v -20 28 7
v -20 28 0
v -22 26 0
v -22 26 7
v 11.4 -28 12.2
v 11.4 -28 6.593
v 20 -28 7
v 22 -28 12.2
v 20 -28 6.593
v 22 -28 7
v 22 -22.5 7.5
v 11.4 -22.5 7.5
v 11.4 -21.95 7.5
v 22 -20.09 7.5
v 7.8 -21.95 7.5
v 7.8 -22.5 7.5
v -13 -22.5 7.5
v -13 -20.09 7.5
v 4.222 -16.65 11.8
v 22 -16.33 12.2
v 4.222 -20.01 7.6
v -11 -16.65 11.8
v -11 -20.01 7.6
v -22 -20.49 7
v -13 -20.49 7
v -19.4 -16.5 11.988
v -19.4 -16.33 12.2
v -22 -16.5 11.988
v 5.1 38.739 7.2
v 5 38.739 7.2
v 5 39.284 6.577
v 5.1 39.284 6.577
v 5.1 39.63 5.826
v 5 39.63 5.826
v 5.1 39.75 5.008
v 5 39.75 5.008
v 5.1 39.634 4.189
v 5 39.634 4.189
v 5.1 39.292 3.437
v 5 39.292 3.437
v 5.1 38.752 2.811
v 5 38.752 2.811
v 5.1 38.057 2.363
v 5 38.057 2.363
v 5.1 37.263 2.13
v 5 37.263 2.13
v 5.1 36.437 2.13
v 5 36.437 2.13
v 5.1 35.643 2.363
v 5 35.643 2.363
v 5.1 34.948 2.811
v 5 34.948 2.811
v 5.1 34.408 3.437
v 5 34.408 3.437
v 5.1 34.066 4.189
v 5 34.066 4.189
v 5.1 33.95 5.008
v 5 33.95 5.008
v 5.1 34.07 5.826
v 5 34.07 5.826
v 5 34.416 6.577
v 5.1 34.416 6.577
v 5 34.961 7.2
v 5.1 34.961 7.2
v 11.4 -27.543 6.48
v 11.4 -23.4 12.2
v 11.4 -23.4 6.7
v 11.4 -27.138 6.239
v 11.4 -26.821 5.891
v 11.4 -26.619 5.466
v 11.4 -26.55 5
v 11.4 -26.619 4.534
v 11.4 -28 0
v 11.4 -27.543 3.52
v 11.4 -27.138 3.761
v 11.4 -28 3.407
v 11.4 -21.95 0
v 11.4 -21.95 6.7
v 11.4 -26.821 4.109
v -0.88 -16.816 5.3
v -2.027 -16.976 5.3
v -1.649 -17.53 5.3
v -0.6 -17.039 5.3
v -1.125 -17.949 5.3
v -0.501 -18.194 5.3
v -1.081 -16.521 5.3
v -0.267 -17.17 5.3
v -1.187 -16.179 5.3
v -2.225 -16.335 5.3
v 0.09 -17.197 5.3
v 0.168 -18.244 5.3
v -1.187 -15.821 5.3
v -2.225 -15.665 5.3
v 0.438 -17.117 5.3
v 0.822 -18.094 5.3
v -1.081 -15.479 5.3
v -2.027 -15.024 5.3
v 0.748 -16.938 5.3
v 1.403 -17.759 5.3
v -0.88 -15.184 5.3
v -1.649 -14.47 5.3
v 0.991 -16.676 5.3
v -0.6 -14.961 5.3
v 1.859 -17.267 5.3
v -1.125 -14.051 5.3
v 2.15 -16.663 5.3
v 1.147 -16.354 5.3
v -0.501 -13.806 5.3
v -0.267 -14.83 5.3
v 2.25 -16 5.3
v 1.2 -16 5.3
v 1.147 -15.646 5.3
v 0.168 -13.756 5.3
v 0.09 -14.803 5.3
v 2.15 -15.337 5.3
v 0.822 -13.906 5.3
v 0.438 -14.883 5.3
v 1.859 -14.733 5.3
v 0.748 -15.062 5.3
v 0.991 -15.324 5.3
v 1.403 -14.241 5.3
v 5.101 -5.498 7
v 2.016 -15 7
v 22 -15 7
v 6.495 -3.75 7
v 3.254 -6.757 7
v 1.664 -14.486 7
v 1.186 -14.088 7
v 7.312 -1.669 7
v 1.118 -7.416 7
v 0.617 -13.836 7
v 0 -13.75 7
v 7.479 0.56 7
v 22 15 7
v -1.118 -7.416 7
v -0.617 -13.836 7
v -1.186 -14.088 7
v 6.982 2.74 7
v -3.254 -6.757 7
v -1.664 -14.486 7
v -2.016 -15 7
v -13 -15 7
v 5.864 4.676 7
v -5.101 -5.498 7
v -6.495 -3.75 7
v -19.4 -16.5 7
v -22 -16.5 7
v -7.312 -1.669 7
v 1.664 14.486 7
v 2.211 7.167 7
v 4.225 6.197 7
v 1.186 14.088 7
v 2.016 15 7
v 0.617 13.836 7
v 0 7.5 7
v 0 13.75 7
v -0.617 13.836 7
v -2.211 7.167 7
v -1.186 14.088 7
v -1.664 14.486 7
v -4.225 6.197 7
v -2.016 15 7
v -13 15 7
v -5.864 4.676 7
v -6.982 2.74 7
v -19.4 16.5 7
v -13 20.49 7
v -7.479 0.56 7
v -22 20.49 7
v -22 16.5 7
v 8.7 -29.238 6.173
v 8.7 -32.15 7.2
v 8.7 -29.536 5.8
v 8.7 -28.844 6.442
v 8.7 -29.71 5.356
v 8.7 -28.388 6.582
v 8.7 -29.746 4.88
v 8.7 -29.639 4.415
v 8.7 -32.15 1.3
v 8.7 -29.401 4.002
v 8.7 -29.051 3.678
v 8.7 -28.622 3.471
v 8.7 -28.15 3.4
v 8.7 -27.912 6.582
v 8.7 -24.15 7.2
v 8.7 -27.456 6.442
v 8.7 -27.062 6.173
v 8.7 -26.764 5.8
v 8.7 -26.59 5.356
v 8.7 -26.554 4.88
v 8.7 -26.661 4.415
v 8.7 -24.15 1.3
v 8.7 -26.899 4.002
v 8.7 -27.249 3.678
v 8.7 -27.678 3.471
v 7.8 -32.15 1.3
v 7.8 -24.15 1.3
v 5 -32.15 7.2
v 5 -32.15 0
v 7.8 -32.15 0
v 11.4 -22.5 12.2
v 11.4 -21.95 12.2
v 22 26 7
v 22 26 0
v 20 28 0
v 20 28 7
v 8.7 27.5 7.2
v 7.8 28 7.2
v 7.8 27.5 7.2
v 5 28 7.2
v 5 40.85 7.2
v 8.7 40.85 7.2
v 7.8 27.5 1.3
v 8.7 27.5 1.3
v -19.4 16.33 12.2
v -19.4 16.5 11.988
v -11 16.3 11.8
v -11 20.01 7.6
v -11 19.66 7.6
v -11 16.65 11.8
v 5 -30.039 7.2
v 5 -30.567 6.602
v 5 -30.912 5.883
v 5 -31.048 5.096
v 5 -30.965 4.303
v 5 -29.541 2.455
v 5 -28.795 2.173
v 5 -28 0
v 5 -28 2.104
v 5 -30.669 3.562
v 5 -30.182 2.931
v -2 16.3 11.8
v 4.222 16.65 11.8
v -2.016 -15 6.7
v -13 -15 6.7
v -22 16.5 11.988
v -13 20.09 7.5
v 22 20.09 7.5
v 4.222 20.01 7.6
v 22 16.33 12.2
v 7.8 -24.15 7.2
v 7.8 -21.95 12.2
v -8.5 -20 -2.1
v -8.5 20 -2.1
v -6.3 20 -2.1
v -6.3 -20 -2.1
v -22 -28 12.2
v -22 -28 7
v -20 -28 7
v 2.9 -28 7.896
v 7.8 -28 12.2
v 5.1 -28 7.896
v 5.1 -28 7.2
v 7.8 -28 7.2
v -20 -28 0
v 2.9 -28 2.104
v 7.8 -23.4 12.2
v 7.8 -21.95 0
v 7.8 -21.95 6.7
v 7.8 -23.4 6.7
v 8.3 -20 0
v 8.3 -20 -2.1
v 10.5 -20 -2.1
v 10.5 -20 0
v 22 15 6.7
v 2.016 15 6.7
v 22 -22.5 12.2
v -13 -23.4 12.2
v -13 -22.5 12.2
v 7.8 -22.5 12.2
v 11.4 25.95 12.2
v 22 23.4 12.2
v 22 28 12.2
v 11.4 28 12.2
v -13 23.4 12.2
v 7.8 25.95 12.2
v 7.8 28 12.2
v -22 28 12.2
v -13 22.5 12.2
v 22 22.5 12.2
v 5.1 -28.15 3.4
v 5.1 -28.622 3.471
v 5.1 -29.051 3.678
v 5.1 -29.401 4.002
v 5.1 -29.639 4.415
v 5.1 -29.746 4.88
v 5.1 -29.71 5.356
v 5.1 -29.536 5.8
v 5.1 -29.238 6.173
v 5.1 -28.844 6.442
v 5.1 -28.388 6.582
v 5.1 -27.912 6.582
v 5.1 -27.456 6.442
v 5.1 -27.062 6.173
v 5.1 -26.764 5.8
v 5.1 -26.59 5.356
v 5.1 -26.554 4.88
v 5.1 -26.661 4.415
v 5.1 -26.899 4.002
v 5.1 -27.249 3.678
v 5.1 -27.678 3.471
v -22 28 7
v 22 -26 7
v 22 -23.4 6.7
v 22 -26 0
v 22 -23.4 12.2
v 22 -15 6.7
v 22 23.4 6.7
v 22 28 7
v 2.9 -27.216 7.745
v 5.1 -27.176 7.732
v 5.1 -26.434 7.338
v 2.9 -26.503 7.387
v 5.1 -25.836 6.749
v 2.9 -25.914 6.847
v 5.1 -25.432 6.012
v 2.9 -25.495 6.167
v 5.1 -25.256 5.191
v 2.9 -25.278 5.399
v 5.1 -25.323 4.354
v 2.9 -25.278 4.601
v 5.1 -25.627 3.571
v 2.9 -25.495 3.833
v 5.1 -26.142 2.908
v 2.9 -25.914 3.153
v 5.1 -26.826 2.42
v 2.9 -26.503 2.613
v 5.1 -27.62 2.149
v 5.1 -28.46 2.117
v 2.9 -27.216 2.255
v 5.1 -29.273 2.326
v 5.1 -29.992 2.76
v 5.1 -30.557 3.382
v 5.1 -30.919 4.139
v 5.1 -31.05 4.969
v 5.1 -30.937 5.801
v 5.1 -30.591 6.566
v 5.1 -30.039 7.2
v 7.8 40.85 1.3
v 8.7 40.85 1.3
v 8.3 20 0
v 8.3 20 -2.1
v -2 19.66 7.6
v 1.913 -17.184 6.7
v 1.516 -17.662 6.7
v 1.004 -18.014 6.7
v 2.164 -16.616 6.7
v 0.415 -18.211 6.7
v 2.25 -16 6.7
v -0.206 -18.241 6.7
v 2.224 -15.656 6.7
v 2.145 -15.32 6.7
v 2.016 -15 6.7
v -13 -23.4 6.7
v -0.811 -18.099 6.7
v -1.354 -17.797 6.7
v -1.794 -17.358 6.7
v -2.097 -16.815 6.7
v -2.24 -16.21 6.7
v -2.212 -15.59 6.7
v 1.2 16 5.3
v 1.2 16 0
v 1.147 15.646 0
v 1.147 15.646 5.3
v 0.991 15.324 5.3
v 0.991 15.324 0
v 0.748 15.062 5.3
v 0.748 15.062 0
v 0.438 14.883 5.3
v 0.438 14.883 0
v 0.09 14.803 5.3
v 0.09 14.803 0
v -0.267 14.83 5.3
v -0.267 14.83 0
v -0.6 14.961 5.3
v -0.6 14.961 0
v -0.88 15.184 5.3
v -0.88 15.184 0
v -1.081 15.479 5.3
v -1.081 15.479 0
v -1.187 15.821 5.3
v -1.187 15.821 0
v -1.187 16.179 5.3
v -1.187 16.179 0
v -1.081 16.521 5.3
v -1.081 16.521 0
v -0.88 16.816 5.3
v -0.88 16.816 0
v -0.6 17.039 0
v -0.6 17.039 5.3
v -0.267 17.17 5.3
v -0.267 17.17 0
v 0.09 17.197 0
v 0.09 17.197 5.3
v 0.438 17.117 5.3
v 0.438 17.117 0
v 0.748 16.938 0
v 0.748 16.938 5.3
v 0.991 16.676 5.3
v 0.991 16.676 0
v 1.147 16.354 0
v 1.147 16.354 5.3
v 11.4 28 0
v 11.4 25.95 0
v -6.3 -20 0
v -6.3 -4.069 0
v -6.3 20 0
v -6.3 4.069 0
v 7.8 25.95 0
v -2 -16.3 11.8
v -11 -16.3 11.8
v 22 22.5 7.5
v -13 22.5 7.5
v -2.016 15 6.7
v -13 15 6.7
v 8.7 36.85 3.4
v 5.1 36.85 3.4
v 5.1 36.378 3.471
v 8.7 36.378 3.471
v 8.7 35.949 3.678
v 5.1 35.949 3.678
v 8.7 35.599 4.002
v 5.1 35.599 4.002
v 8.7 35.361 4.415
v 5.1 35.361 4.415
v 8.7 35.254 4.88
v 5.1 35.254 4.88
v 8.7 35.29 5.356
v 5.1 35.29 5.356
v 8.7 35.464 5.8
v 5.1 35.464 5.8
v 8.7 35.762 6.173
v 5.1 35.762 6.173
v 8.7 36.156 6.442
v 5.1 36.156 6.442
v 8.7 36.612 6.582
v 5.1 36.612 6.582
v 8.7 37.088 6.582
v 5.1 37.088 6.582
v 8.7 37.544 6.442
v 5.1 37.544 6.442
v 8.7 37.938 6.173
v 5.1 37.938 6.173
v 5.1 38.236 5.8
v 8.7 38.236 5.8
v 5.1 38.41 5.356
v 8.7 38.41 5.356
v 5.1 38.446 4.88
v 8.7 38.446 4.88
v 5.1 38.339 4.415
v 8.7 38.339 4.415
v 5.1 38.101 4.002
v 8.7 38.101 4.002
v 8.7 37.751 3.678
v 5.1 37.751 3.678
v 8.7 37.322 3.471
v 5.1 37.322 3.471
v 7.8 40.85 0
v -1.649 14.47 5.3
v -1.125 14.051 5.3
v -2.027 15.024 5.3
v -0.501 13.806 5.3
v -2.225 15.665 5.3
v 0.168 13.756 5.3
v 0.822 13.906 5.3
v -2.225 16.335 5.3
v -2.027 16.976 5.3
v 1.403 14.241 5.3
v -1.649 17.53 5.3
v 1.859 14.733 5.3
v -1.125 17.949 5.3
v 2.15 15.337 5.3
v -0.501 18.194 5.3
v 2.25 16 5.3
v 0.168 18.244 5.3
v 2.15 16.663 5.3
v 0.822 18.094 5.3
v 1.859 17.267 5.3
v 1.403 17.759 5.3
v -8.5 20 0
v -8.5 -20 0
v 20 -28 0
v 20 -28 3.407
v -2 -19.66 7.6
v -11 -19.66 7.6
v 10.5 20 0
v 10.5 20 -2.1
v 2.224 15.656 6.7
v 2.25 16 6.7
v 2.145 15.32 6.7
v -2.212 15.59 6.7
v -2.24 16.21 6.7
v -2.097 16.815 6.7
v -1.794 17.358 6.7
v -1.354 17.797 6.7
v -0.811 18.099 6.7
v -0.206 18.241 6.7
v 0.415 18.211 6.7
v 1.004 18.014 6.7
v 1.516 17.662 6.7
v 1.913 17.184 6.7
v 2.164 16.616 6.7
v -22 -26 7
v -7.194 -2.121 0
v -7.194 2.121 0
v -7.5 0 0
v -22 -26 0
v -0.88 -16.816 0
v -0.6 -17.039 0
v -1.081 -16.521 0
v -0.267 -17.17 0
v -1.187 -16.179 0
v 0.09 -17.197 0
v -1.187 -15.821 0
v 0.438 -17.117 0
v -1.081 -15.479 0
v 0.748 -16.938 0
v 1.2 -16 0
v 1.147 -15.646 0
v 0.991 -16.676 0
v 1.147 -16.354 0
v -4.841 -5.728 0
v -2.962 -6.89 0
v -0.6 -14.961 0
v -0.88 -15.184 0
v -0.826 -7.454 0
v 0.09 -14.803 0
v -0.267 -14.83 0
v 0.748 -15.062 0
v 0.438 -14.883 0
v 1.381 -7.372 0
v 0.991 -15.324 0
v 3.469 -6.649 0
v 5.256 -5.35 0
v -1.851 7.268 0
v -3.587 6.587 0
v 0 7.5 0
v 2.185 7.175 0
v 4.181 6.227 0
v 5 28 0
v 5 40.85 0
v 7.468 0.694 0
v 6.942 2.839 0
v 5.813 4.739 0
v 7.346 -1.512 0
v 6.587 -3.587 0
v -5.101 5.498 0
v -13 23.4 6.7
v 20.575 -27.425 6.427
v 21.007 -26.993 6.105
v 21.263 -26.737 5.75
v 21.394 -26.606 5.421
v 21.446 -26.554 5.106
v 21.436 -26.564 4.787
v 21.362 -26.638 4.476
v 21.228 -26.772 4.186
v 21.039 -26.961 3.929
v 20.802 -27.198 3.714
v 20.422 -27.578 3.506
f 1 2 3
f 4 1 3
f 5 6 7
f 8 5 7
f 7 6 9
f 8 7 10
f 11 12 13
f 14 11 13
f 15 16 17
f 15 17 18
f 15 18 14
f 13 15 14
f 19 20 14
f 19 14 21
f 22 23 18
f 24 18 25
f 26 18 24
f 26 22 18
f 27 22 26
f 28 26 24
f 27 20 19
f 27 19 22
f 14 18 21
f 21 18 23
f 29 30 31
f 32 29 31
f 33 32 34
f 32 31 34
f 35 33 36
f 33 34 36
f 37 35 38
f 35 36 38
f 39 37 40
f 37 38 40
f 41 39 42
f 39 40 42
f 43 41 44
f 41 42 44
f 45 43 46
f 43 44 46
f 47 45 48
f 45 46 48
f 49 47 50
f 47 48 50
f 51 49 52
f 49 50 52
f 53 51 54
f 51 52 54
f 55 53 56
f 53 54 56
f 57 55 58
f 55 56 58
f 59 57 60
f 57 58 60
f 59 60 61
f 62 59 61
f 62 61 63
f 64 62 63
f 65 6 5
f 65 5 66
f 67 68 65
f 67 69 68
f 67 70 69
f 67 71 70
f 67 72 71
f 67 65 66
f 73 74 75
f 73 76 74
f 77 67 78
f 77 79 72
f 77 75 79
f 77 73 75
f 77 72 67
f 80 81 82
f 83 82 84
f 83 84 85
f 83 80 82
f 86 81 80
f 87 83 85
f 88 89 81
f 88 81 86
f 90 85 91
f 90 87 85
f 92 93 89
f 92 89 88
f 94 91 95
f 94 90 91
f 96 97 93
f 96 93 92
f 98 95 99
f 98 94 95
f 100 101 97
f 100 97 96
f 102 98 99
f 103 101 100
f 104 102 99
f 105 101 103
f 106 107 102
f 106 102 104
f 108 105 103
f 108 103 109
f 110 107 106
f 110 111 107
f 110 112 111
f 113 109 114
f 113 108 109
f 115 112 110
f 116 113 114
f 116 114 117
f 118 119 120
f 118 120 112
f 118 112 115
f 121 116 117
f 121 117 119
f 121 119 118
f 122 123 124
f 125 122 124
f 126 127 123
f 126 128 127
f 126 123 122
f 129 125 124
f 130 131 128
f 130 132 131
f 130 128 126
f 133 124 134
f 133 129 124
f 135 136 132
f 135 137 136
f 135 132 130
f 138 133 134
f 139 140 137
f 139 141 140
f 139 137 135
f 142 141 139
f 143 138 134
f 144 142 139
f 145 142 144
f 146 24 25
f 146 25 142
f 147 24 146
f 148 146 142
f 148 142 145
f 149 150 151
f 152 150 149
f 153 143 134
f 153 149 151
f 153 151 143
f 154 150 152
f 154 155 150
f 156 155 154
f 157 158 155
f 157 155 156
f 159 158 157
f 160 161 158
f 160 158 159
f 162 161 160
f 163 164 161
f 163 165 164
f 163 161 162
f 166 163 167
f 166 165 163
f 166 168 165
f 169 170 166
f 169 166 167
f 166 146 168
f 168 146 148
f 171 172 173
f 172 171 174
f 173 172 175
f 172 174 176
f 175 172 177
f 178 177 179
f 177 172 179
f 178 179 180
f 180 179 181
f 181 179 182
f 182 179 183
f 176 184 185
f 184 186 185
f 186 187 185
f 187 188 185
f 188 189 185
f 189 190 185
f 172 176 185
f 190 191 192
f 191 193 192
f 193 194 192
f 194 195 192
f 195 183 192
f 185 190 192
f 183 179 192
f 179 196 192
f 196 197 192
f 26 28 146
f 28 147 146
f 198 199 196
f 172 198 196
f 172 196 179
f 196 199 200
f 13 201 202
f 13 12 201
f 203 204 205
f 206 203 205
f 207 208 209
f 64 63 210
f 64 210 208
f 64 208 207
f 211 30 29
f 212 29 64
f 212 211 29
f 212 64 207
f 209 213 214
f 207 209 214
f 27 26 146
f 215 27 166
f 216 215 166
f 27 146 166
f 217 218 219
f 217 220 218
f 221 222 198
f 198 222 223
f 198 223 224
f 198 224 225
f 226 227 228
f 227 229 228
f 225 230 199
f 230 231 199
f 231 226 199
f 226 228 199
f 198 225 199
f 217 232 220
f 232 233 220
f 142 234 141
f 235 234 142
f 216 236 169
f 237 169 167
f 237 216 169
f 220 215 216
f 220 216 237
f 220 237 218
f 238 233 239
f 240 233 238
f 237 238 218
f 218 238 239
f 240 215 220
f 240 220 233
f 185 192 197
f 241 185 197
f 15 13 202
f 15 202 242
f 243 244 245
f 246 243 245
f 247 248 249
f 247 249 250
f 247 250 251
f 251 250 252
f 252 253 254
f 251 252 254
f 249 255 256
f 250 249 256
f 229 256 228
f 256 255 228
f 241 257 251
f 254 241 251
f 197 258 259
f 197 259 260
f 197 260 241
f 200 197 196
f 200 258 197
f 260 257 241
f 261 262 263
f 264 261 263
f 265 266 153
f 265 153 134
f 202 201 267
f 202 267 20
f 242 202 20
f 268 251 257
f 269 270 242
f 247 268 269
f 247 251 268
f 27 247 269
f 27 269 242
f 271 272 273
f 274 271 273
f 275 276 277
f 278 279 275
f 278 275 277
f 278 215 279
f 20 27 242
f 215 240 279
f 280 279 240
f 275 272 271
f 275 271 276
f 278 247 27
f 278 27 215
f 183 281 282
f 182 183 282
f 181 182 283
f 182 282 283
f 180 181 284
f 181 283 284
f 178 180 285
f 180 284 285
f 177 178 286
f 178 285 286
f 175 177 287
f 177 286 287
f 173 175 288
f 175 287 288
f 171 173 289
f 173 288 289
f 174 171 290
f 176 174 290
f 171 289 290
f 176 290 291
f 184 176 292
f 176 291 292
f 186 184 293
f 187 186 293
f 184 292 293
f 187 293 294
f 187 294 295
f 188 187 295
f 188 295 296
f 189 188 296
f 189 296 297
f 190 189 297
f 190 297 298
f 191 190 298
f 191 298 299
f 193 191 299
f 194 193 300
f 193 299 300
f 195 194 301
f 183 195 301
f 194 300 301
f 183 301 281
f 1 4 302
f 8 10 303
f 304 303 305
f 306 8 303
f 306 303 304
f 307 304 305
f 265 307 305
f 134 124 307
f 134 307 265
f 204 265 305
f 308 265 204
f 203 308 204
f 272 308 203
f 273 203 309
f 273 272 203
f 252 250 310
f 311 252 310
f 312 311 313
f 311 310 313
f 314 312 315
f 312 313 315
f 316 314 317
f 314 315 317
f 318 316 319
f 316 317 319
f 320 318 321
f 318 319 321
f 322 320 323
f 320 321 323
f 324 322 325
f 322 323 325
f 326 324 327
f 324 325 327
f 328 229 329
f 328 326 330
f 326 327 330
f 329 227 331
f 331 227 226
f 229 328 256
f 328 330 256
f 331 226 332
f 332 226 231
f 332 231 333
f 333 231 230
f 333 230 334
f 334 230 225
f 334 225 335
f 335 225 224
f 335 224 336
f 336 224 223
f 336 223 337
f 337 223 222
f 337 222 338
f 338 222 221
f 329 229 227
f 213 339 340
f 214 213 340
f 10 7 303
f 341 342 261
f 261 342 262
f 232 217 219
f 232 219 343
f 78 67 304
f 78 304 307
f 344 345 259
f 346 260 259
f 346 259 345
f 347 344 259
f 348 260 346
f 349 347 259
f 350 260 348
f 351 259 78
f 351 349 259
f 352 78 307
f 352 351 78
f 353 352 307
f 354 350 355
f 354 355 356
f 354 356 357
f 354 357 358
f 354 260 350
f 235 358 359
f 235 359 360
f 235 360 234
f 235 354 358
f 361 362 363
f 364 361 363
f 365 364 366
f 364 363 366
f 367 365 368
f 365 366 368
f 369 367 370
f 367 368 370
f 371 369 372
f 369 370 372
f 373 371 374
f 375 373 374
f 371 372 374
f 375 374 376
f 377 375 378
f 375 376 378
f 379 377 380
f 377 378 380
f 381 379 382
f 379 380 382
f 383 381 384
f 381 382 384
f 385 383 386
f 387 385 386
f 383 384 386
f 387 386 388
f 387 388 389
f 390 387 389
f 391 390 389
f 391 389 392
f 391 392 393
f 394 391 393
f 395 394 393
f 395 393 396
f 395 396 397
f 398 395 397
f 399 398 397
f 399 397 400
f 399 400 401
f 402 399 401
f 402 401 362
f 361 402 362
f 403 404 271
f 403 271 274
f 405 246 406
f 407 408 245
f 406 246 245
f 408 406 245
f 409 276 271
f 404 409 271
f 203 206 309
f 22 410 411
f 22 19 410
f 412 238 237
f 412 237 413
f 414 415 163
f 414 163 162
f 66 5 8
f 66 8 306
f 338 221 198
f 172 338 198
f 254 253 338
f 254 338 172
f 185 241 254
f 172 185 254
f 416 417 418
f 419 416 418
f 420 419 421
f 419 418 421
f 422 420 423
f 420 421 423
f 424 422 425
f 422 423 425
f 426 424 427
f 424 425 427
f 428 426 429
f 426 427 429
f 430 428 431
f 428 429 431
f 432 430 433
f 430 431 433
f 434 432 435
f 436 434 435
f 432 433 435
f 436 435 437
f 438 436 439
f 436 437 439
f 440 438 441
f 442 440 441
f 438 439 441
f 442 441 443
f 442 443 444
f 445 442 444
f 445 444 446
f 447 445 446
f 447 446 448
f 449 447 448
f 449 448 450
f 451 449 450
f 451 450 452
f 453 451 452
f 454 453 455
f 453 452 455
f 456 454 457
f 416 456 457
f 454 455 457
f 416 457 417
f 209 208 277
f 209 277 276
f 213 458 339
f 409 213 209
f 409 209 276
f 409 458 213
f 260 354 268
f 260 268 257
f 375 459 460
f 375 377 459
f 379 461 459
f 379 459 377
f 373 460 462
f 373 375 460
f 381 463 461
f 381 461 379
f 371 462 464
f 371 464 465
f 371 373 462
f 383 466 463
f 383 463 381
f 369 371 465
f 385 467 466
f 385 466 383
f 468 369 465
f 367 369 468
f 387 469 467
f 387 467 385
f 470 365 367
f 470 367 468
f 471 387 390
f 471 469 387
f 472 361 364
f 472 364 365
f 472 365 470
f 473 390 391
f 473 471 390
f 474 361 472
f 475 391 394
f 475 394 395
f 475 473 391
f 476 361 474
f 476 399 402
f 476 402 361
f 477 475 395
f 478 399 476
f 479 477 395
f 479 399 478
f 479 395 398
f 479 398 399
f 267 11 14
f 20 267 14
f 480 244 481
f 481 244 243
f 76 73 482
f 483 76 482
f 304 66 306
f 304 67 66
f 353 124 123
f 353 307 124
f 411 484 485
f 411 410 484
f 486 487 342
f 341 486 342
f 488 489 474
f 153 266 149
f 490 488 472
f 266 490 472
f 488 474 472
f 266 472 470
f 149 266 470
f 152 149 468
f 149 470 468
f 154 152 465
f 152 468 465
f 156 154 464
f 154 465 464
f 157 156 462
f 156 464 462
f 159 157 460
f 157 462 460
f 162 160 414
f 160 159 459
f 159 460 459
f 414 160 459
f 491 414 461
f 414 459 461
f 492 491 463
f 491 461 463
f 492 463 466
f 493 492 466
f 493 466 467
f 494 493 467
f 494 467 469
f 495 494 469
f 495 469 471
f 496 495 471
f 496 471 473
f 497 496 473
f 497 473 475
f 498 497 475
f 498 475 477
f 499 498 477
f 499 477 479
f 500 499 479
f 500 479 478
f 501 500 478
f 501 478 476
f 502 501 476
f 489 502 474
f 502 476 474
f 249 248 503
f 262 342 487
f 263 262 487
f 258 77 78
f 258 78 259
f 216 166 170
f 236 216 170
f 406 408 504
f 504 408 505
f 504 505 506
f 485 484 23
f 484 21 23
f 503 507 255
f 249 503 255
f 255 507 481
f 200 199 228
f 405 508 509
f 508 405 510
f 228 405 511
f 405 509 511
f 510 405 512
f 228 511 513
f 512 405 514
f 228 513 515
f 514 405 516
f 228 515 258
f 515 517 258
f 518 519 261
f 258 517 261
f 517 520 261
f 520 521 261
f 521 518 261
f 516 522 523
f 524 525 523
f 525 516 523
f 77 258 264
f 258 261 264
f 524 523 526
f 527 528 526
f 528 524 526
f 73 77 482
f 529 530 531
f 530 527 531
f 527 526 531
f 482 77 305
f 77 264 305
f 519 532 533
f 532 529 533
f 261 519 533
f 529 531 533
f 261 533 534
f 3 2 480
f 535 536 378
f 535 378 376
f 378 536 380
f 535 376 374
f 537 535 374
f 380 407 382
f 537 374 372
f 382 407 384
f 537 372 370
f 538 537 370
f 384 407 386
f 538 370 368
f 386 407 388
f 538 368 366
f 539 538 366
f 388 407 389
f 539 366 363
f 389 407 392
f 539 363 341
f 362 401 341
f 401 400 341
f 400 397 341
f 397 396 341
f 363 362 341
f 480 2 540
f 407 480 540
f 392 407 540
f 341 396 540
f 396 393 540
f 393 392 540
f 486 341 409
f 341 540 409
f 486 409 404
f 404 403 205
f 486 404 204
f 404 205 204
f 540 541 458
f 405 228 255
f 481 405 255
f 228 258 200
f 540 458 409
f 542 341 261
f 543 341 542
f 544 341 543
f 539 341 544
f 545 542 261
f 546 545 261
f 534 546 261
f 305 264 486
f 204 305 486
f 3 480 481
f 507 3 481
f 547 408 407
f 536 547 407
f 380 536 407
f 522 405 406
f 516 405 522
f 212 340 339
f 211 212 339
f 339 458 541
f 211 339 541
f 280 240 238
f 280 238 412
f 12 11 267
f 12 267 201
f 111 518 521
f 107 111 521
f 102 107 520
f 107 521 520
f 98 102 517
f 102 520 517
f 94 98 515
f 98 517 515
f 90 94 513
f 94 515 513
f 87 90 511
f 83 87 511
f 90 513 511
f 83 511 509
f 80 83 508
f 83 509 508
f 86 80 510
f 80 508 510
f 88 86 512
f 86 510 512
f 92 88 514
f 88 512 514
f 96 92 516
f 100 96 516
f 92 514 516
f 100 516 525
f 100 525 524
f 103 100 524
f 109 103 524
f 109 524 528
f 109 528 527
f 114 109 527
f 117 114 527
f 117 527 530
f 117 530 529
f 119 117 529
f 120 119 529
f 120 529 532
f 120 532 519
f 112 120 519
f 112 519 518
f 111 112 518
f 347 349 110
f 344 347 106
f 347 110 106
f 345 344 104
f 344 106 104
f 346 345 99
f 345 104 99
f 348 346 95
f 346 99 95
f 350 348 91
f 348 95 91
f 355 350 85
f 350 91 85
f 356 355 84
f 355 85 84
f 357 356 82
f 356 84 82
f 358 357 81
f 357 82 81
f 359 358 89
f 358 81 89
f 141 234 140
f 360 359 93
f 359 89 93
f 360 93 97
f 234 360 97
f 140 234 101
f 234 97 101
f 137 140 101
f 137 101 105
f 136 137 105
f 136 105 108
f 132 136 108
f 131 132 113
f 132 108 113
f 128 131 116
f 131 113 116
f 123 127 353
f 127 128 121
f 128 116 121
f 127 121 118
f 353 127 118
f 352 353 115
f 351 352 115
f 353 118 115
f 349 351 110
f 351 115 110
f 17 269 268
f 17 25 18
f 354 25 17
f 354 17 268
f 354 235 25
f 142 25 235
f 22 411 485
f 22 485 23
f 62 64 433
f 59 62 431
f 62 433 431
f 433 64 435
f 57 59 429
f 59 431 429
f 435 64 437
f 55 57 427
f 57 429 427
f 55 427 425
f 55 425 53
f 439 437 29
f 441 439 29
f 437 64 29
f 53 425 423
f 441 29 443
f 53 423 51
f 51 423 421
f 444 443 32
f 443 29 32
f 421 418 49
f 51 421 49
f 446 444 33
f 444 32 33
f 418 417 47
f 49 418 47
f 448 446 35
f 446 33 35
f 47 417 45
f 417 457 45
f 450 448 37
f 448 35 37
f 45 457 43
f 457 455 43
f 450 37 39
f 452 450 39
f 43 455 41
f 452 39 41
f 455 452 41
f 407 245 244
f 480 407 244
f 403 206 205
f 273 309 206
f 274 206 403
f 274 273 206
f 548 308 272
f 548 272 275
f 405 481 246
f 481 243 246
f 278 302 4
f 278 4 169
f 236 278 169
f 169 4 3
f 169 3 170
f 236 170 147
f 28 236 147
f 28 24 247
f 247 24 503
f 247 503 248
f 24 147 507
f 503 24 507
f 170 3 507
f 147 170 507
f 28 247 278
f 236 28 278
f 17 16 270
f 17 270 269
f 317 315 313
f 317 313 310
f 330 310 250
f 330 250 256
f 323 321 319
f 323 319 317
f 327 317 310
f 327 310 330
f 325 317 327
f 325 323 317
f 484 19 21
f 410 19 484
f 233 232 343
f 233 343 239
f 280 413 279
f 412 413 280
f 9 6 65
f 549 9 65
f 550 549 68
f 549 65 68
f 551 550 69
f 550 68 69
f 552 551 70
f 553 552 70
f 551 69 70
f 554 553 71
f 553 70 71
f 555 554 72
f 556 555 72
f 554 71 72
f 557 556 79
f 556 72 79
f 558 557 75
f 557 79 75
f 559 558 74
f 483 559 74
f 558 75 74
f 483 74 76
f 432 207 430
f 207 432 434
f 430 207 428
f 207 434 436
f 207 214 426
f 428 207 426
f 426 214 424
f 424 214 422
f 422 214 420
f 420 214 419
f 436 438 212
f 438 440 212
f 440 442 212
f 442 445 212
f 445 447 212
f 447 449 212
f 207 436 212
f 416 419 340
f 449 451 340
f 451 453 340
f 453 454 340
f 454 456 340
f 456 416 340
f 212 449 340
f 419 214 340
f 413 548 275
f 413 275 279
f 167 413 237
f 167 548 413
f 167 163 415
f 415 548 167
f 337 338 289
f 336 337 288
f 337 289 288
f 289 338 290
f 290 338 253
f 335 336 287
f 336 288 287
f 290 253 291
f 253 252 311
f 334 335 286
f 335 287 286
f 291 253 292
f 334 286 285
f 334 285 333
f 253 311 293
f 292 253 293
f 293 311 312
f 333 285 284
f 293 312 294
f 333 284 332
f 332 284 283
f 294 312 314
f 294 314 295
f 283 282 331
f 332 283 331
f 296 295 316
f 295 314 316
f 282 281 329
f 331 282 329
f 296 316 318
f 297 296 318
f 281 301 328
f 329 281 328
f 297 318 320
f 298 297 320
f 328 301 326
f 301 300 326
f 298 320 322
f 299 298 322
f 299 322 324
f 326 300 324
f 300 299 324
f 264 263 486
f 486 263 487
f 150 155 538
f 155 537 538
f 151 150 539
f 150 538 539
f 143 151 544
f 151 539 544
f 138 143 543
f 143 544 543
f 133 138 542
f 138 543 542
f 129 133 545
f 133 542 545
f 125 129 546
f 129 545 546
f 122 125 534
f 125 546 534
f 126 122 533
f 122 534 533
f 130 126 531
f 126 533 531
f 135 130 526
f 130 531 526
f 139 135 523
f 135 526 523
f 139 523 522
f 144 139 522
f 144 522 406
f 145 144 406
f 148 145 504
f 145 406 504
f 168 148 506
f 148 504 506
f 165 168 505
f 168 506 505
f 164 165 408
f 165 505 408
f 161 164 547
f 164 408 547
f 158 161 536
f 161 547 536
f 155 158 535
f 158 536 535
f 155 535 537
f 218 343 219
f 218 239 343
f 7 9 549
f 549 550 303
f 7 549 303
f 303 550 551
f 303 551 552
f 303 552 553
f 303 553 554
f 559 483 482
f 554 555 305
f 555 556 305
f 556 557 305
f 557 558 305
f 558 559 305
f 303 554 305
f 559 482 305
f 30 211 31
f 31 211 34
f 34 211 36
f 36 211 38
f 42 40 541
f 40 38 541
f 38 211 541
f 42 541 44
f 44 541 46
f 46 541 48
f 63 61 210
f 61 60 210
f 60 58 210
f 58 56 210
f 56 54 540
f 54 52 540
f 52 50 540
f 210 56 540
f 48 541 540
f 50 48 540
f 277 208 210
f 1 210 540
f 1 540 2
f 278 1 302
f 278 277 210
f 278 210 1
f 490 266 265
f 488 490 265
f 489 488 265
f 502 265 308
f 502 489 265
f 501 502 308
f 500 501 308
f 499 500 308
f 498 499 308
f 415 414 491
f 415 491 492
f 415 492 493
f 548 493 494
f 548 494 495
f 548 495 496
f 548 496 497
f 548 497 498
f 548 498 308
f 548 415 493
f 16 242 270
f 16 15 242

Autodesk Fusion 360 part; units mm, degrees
ref_plane "工作平面1" through (0, 0, 0) normal (0, 0, 1) x (1, 0, 0)
sketch "草图1" plane through (0, 0, 0) normal (0, 0, 1) x (1, 0, 0)
  line L0 (-26, -22) -> (26, -22)
  line L1 (26, -22) -> (28, -20)
  line L2 (28, -20) -> (28, 20)
  line L3 (28, 20) -> (26, 22)
  line L4 (26, 22) -> (-26, 22)
  line L5 (-26, 22) -> (-28, 20)
  line L6 (-28, 20) -> (-28, -20)
  line L7 (-28, -20) -> (-26, -22)
extrude "56 x 44 x 7 platform" add sketch "草图1" along normal blind 7
ref_plane "工作平面2" through (0, 0, 7) normal (0, 0, 1) x (1, 0, 0)
sketch "草图2" plane through (0, 0, 7) normal (0, 0, 1) x (1, 0, 0)
  line L0 (-28, -22) -> (-20.49, -22)
  line L1 (-20.49, -22) -> (-20.49, 22)
  line L2 (-20.49, 22) -> (-28, 22)
  line L3 (-28, 22) -> (-28, -22)
ref_plane "工作平面3" through (0, 0, 12.2) normal (0, 0, 1) x (1, 0, 0)
sketch "草图3" plane through (0, 0, 12.2) normal (0, 0, 1) x (1, 0, 0)
  line L0 (-28, -22) -> (-16.33, -22)
  line L1 (-16.33, -22) -> (-16.33, 22)
  line L2 (-16.33, 22) -> (-28, 22)
  line L3 (-28, 22) -> (-28, -22)
loft "Dovetail retaining rail 0.8 to 1 -1" add profiles "草图2", "草图3" section 1 section 2
ref_plane "工作平面4" through (0, 0, 6.7) normal (0, 0, 1) x (1, 0, 0)
sketch "草图4" plane through (0, 0, 6.7) normal (0, 0, 1) x (1, 0, 0)
  line L0 (-23.4, -22) -> (-22.5, -22)
  line L1 (-22.5, -22) -> (-22.5, 13)
  line L2 (-22.5, 13) -> (-23.4, 13)
  line L3 (-23.4, 13) -> (-23.4, -22)
extrude "0.9 mm longitudinal flexure slot -1" cut sketch "草图4" along normal blind 5.8
ref_plane "工作平面5" through (0, 0, 6.7) normal (0, 0, 1) x (1, 0, 0)
sketch "草图5" plane through (0, 0, 6.7) normal (0, 0, 1) x (1, 0, 0)
  line L0 (-22.5, -22) -> (-15, -22)
  line L1 (-15, -22) -> (-15, 13)
  line L2 (-15, 13) -> (-22.5, 13)
  line L3 (-22.5, 13) -> (-22.5, -22)
extrude "0.8 mm flexure underside relief -1" cut sketch "草图5" along normal blind 0.8
ref_plane "工作平面6" through (0, 0, 7.6) normal (0, 0, 1) x (1, 0, 0)
sketch "草图6" plane through (0, 0, 7.6) normal (0, 0, 1) x (1, 0, 0)
  line L0 (-20.21, -6) -> (-20.21, 11)
  line L1 (-20.21, 11) -> (-19.66, 11)
  line L2 (-19.66, 11) -> (-19.66, 2)
  line L3 (-19.66, 2) -> (-20.11, -6)
  line L4 (-20.11, -6) -> (-20.21, -6)
ref_plane "工作平面7" through (0, 0, 11.8) normal (0, 0, 1) x (1, 0, 0)
sketch "草图7" plane through (0, 0, 11.8) normal (0, 0, 1) x (1, 0, 0)
  line L0 (-16.85, -6) -> (-16.85, 11)
  line L1 (-16.85, 11) -> (-16.3, 11)
  line L2 (-16.3, 11) -> (-16.3, 2)
  line L3 (-16.3, 2) -> (-16.75, -6)
  line L4 (-16.75, -6) -> (-16.85, -6)
loft "Tapered friction contact rib -1" add profiles "草图6", "草图7" section 1 section 2
ref_plane "工作平面8" through (0, 0, 7) normal (0, 0, 1) x (1, 0, 0)
sketch "草图8" plane through (0, 0, 7) normal (0, 0, 1) x (1, 0, 0)
  line L0 (20.49, -22) -> (28, -22)
  line L1 (28, -22) -> (28, 22)
  line L2 (28, 22) -> (20.49, 22)
  line L3 (20.49, 22) -> (20.49, -22)
ref_plane "工作平面9" through (0, 0, 12.2) normal (0, 0, 1) x (1, 0, 0)
sketch "草图9" plane through (0, 0, 12.2) normal (0, 0, 1) x (1, 0, 0)
  line L0 (16.33, -22) -> (28, -22)
  line L1 (28, -22) -> (28, 22)
  line L2 (28, 22) -> (16.33, 22)
  line L3 (16.33, 22) -> (16.33, -22)
loft "Dovetail retaining rail 0.8 to 1 1" add profiles "草图8", "草图9" section 1 section 2
ref_plane "工作平面10" through (0, 0, 6.7) normal (0, 0, 1) x (1, 0, 0)
sketch "草图10" plane through (0, 0, 6.7) normal (0, 0, 1) x (1, 0, 0)
  line L0 (22.5, -22) -> (23.4, -22)
  line L1 (23.4, -22) -> (23.4, 13)
  line L2 (23.4, 13) -> (22.5, 13)
  line L3 (22.5, 13) -> (22.5, -22)
extrude "0.9 mm longitudinal flexure slot 1" cut sketch "草图10" along normal blind 5.8
ref_plane "工作平面11" through (0, 0, 6.7) normal (0, 0, 1) x (1, 0, 0)
sketch "草图11" plane through (0, 0, 6.7) normal (0, 0, 1) x (1, 0, 0)
  line L0 (15, -22) -> (22.5, -22)
  line L1 (22.5, -22) -> (22.5, 13)
  line L2 (22.5, 13) -> (15, 13)
  line L3 (15, 13) -> (15, -22)
extrude "0.8 mm flexure underside relief 1" cut sketch "草图11" along normal blind 0.8
ref_plane "工作平面12" through (0, 0, 7.6) normal (0, 0, 1) x (1, 0, 0)
sketch "草图12" plane through (0, 0, 7.6) normal (0, 0, 1) x (1, 0, 0)
  line L0 (20.21, -6) -> (20.21, 11)
  line L1 (20.21, 11) -> (19.66, 11)
  line L2 (19.66, 11) -> (19.66, 2)
  line L3 (19.66, 2) -> (20.11, -6)
  line L4 (20.11, -6) -> (20.21, -6)
ref_plane "工作平面13" through (0, 0, 11.8) normal (0, 0, 1) x (1, 0, 0)
sketch "草图13" plane through (0, 0, 11.8) normal (0, 0, 1) x (1, 0, 0)
  line L0 (16.85, -6) -> (16.85, 11)
  line L1 (16.85, 11) -> (16.3, 11)
  line L2 (16.3, 11) -> (16.3, 2)
  line L3 (16.3, 2) -> (16.75, -6)
  line L4 (16.75, -6) -> (16.85, -6)
loft "Tapered friction contact rib 1" add profiles "草图12", "草图13" section 1 section 2
ref_plane "工作平面14" through (0, 0, 7) normal (0, 0, 1) x (1, 0, 0)
sketch "草图14" plane through (0, 0, 7) normal (0, 0, 1) x (1, 0, 0)
  line L0 (-16.5, 19.4) -> (16.5, 19.4)
  line L1 (16.5, 19.4) -> (16.5, 22)
  line L2 (16.5, 22) -> (-16.5, 22)
  line L3 (-16.5, 22) -> (-16.5, 19.4)
extrude "Closed insertion end stop" add sketch "草图14" along normal blind 5.2
ref_plane "工作平面15" through (0, 0, 0) normal (0, 0, 1) x (1, 0, 0)
sketch "草图15" plane through (0, 0, 0) normal (0, 0, 1) x (1, 0, 0)
  circle A0 centre (0, 0) radius 7.5
extrude "15 mm screw and driver access" cut sketch "草图15" along normal blind 7
move_body "Align camera long edge with gimbal arm - 90 degrees" bodies 1 to x (0, 1, 0) y (-1, 0, 0) z (0, 0, 1) at (0, 0, 0)
ref_plane "工作平面16" through (0, 0, 0) normal (0, 0, 1) x (1, 0, 0)
sketch "草图16" plane through (0, 0, 0) normal (0, 0, 1) x (1, 0, 0)
  line L0 (7.8, -28) -> (11.4, -28)
  line L1 (11.4, -28) -> (11.4, -21.95)
  line L2 (11.4, -21.95) -> (7.8, -21.95)
  line L3 (7.8, -21.95) -> (7.8, -28)
extrude "Clear original raised tab and root fillet" cut sketch "草图16" along normal blind 12.3
ref_plane "工作平面17" through (0, 0, 0) normal (0, 0, 1) x (1, 0, 0)
sketch "草图17" plane through (0, 0, 0) normal (0, 0, 1) x (1, 0, 0)
  line L0 (7.8, 25.95) -> (11.4, 25.95)
  line L1 (11.4, 25.95) -> (11.4, 28)
  line L2 (11.4, 28) -> (7.8, 28)
  line L3 (7.8, 28) -> (7.8, 25.95)
extrude "Clear original raised tab and root fillet (1)" cut sketch "草图17" along normal blind 12.3
ref_plane "工作平面18" through (0, 0, -2.1) normal (0, 0, 1) x (1, 0, 0)
sketch "草图18" plane through (0, 0, -2.1) normal (0, 0, 1) x (1, 0, 0)
  line L0 (-8.5, -20) -> (-6.3, -20)
  line L1 (-6.3, -20) -> (-6.3, 20)
  line L2 (-6.3, 20) -> (-8.5, 20)
  line L3 (-8.5, 20) -> (-8.5, -20)
extrude "Arm lateral locating shoulder" add sketch "草图18" along normal blind 2.1
ref_plane "工作平面19" through (0, 0, -2.1) normal (0, 0, 1) x (1, 0, 0)
sketch "草图19" plane through (0, 0, -2.1) normal (0, 0, 1) x (1, 0, 0)
  line L0 (8.3, -20) -> (10.5, -20)
  line L1 (10.5, -20) -> (10.5, 20)
  line L2 (10.5, 20) -> (8.3, 20)
  line L3 (8.3, 20) -> (8.3, -20)
extrude "Arm lateral locating shoulder (1)" add sketch "草图19" along normal blind 2.1
ref_plane "工作平面20" through (0, 0, 0) normal (0, 0, 1) x (1, 0, 0)
sketch "草图20" plane through (0, 0, 0) normal (0, 0, 1) x (1, 0, 0)
  circle A0 centre (0, -16) radius 1.2
extrude "M2 through clearance at y -16.0" cut sketch "草图20" along normal blind 7
ref_plane "工作平面21" through (0, 0, 5.3) normal (0, 0, 1) x (1, 0, 0)
sketch "草图21" plane through (0, 0, 5.3) normal (0, 0, 1) x (1, 0, 0)
  circle A0 centre (0, -16) radius 2.25
extrude "M2 head recess at y -16.0" cut sketch "草图21" along normal blind 1.7
ref_plane "工作平面22" through (0, 0, 0) normal (0, 0, 1) x (1, 0, 0)
sketch "草图22" plane through (0, 0, 0) normal (0, 0, 1) x (1, 0, 0)
  circle A0 centre (0, 16) radius 1.2
extrude "M2 through clearance at y 16.0" cut sketch "草图22" along normal blind 7
ref_plane "工作平面23" through (0, 0, 5.3) normal (0, 0, 1) x (1, 0, 0)
sketch "草图23" plane through (0, 0, 5.3) normal (0, 0, 1) x (1, 0, 0)
  circle A0 centre (0, 16) radius 2.25
extrude "M2 head recess at y 16.0" cut sketch "草图23" along normal blind 1.7
ref_plane "工作平面24" through (0, 0, 0) normal (0, 0, 1) x (1, 0, 0)
sketch "草图24" plane through (0, 0, 0) normal (0, 0, 1) x (1, 0, 0)
  line L0 (5, -32.15) -> (8.7, -32.15)
  line L1 (8.7, -32.15) -> (8.7, -24.15)
  line L2 (8.7, -24.15) -> (5, -24.15)
  line L3 (5, -24.15) -> (5, -32.15)
extrude "Ear for original 3.2 mm side hole at arm y -28.15" add sketch "草图24" along normal blind 7.2
ref_plane "工作平面25" through (0, 0, 0) normal (0, 0, 1) x (1, 0, 0)
sketch "草图25" plane through (0, 0, 0) normal (0, 0, 1) x (1, 0, 0)
  line L0 (7.8, -32.15) -> (8.9, -32.15)
  line L1 (8.9, -32.15) -> (8.9, -24.15)
  line L2 (8.9, -24.15) -> (7.8, -24.15)
  line L3 (7.8, -24.15) -> (7.8, -32.15)
extrude "Ear relief around original arm root radius" cut sketch "草图25" along normal blind 1.3
ref_plane "工作平面26" through (4.9, 0, 0) normal (1, 0, 0) x (0, 1, 0)
sketch "草图26" plane through (4.9, 0, 0) normal (1, 0, 0) x (0, 0, -1)
  circle A0 centre (-5, -28.15) radius 1.6
extrude "Side rivet ear clearance" cut sketch "草图26" along normal blind 4
ref_plane "工作平面27" through (0, 0, 0) normal (0, 0, 1) x (1, 0, 0)
sketch "草图27" plane through (0, 0, 0) normal (0, 0, 1) x (1, 0, 0)
  line L0 (5, 27.5) -> (8.7, 27.5)
  line L1 (8.7, 27.5) -> (8.7, 40.85)
  line L2 (8.7, 40.85) -> (5, 40.85)
  line L3 (5, 40.85) -> (5, 27.5)
extrude "Ear for original 3.2 mm side hole at arm y 36.85" add sketch "草图27" along normal blind 7.2
ref_plane "工作平面28" through (0, 0, 0) normal (0, 0, 1) x (1, 0, 0)
sketch "草图28" plane through (0, 0, 0) normal (0, 0, 1) x (1, 0, 0)
  line L0 (7.8, 27.5) -> (8.9, 27.5)
  line L1 (8.9, 27.5) -> (8.9, 40.85)
  line L2 (8.9, 40.85) -> (7.8, 40.85)
  line L3 (7.8, 40.85) -> (7.8, 27.5)
extrude "Ear relief around original arm root radius (1)" cut sketch "草图28" along normal blind 1.3
ref_plane "工作平面29" through (4.9, 0, 0) normal (1, 0, 0) x (0, 1, 0)
sketch "草图29" plane through (4.9, 0, 0) normal (1, 0, 0) x (0, 0, -1)
  circle A0 centre (-5, 36.85) radius 1.6
extrude "Side rivet ear clearance (1)" cut sketch "草图29" along normal blind 4
ref_plane "工作平面30" through (4.9, 0, 0) normal (1, 0, 0) x (0, 1, 0)
sketch "草图30" plane through (4.9, 0, 0) normal (1, 0, 0) x (0, 0, -1)
  circle A0 centre (-5, -28.15) radius 1.6
extrude "Side rivet full passage clearance" cut sketch "草图30" along normal blind 20
ref_plane "工作平面31" through (2.9, 0, 0) normal (1, 0, 0) x (0, 1, 0)
sketch "草图31" plane through (2.9, 0, 0) normal (1, 0, 0) x (0, 0, -1)
  circle A0 centre (-5, -28.15) radius 2.9
extrude "Side rivet flange counterbore" cut sketch "草图31" along normal blind 2.2
ref_plane "工作平面32" through (4.9, 0, 0) normal (1, 0, 0) x (0, 1, 0)
sketch "草图32" plane through (4.9, 0, 0) normal (1, 0, 0) x (0, 0, -1)
  circle A0 centre (-5, 36.85) radius 1.6
ref_plane "工作平面33" through (2.9, 0, 0) normal (1, 0, 0) x (0, 1, 0)
sketch "草图33" plane through (2.9, 0, 0) normal (1, 0, 0) x (0, 0, -1)
  circle A0 centre (-5, 36.85) radius 2.9
extrude "Side rivet flange counterbore (1)" cut sketch "草图33" along normal blind 2.2
